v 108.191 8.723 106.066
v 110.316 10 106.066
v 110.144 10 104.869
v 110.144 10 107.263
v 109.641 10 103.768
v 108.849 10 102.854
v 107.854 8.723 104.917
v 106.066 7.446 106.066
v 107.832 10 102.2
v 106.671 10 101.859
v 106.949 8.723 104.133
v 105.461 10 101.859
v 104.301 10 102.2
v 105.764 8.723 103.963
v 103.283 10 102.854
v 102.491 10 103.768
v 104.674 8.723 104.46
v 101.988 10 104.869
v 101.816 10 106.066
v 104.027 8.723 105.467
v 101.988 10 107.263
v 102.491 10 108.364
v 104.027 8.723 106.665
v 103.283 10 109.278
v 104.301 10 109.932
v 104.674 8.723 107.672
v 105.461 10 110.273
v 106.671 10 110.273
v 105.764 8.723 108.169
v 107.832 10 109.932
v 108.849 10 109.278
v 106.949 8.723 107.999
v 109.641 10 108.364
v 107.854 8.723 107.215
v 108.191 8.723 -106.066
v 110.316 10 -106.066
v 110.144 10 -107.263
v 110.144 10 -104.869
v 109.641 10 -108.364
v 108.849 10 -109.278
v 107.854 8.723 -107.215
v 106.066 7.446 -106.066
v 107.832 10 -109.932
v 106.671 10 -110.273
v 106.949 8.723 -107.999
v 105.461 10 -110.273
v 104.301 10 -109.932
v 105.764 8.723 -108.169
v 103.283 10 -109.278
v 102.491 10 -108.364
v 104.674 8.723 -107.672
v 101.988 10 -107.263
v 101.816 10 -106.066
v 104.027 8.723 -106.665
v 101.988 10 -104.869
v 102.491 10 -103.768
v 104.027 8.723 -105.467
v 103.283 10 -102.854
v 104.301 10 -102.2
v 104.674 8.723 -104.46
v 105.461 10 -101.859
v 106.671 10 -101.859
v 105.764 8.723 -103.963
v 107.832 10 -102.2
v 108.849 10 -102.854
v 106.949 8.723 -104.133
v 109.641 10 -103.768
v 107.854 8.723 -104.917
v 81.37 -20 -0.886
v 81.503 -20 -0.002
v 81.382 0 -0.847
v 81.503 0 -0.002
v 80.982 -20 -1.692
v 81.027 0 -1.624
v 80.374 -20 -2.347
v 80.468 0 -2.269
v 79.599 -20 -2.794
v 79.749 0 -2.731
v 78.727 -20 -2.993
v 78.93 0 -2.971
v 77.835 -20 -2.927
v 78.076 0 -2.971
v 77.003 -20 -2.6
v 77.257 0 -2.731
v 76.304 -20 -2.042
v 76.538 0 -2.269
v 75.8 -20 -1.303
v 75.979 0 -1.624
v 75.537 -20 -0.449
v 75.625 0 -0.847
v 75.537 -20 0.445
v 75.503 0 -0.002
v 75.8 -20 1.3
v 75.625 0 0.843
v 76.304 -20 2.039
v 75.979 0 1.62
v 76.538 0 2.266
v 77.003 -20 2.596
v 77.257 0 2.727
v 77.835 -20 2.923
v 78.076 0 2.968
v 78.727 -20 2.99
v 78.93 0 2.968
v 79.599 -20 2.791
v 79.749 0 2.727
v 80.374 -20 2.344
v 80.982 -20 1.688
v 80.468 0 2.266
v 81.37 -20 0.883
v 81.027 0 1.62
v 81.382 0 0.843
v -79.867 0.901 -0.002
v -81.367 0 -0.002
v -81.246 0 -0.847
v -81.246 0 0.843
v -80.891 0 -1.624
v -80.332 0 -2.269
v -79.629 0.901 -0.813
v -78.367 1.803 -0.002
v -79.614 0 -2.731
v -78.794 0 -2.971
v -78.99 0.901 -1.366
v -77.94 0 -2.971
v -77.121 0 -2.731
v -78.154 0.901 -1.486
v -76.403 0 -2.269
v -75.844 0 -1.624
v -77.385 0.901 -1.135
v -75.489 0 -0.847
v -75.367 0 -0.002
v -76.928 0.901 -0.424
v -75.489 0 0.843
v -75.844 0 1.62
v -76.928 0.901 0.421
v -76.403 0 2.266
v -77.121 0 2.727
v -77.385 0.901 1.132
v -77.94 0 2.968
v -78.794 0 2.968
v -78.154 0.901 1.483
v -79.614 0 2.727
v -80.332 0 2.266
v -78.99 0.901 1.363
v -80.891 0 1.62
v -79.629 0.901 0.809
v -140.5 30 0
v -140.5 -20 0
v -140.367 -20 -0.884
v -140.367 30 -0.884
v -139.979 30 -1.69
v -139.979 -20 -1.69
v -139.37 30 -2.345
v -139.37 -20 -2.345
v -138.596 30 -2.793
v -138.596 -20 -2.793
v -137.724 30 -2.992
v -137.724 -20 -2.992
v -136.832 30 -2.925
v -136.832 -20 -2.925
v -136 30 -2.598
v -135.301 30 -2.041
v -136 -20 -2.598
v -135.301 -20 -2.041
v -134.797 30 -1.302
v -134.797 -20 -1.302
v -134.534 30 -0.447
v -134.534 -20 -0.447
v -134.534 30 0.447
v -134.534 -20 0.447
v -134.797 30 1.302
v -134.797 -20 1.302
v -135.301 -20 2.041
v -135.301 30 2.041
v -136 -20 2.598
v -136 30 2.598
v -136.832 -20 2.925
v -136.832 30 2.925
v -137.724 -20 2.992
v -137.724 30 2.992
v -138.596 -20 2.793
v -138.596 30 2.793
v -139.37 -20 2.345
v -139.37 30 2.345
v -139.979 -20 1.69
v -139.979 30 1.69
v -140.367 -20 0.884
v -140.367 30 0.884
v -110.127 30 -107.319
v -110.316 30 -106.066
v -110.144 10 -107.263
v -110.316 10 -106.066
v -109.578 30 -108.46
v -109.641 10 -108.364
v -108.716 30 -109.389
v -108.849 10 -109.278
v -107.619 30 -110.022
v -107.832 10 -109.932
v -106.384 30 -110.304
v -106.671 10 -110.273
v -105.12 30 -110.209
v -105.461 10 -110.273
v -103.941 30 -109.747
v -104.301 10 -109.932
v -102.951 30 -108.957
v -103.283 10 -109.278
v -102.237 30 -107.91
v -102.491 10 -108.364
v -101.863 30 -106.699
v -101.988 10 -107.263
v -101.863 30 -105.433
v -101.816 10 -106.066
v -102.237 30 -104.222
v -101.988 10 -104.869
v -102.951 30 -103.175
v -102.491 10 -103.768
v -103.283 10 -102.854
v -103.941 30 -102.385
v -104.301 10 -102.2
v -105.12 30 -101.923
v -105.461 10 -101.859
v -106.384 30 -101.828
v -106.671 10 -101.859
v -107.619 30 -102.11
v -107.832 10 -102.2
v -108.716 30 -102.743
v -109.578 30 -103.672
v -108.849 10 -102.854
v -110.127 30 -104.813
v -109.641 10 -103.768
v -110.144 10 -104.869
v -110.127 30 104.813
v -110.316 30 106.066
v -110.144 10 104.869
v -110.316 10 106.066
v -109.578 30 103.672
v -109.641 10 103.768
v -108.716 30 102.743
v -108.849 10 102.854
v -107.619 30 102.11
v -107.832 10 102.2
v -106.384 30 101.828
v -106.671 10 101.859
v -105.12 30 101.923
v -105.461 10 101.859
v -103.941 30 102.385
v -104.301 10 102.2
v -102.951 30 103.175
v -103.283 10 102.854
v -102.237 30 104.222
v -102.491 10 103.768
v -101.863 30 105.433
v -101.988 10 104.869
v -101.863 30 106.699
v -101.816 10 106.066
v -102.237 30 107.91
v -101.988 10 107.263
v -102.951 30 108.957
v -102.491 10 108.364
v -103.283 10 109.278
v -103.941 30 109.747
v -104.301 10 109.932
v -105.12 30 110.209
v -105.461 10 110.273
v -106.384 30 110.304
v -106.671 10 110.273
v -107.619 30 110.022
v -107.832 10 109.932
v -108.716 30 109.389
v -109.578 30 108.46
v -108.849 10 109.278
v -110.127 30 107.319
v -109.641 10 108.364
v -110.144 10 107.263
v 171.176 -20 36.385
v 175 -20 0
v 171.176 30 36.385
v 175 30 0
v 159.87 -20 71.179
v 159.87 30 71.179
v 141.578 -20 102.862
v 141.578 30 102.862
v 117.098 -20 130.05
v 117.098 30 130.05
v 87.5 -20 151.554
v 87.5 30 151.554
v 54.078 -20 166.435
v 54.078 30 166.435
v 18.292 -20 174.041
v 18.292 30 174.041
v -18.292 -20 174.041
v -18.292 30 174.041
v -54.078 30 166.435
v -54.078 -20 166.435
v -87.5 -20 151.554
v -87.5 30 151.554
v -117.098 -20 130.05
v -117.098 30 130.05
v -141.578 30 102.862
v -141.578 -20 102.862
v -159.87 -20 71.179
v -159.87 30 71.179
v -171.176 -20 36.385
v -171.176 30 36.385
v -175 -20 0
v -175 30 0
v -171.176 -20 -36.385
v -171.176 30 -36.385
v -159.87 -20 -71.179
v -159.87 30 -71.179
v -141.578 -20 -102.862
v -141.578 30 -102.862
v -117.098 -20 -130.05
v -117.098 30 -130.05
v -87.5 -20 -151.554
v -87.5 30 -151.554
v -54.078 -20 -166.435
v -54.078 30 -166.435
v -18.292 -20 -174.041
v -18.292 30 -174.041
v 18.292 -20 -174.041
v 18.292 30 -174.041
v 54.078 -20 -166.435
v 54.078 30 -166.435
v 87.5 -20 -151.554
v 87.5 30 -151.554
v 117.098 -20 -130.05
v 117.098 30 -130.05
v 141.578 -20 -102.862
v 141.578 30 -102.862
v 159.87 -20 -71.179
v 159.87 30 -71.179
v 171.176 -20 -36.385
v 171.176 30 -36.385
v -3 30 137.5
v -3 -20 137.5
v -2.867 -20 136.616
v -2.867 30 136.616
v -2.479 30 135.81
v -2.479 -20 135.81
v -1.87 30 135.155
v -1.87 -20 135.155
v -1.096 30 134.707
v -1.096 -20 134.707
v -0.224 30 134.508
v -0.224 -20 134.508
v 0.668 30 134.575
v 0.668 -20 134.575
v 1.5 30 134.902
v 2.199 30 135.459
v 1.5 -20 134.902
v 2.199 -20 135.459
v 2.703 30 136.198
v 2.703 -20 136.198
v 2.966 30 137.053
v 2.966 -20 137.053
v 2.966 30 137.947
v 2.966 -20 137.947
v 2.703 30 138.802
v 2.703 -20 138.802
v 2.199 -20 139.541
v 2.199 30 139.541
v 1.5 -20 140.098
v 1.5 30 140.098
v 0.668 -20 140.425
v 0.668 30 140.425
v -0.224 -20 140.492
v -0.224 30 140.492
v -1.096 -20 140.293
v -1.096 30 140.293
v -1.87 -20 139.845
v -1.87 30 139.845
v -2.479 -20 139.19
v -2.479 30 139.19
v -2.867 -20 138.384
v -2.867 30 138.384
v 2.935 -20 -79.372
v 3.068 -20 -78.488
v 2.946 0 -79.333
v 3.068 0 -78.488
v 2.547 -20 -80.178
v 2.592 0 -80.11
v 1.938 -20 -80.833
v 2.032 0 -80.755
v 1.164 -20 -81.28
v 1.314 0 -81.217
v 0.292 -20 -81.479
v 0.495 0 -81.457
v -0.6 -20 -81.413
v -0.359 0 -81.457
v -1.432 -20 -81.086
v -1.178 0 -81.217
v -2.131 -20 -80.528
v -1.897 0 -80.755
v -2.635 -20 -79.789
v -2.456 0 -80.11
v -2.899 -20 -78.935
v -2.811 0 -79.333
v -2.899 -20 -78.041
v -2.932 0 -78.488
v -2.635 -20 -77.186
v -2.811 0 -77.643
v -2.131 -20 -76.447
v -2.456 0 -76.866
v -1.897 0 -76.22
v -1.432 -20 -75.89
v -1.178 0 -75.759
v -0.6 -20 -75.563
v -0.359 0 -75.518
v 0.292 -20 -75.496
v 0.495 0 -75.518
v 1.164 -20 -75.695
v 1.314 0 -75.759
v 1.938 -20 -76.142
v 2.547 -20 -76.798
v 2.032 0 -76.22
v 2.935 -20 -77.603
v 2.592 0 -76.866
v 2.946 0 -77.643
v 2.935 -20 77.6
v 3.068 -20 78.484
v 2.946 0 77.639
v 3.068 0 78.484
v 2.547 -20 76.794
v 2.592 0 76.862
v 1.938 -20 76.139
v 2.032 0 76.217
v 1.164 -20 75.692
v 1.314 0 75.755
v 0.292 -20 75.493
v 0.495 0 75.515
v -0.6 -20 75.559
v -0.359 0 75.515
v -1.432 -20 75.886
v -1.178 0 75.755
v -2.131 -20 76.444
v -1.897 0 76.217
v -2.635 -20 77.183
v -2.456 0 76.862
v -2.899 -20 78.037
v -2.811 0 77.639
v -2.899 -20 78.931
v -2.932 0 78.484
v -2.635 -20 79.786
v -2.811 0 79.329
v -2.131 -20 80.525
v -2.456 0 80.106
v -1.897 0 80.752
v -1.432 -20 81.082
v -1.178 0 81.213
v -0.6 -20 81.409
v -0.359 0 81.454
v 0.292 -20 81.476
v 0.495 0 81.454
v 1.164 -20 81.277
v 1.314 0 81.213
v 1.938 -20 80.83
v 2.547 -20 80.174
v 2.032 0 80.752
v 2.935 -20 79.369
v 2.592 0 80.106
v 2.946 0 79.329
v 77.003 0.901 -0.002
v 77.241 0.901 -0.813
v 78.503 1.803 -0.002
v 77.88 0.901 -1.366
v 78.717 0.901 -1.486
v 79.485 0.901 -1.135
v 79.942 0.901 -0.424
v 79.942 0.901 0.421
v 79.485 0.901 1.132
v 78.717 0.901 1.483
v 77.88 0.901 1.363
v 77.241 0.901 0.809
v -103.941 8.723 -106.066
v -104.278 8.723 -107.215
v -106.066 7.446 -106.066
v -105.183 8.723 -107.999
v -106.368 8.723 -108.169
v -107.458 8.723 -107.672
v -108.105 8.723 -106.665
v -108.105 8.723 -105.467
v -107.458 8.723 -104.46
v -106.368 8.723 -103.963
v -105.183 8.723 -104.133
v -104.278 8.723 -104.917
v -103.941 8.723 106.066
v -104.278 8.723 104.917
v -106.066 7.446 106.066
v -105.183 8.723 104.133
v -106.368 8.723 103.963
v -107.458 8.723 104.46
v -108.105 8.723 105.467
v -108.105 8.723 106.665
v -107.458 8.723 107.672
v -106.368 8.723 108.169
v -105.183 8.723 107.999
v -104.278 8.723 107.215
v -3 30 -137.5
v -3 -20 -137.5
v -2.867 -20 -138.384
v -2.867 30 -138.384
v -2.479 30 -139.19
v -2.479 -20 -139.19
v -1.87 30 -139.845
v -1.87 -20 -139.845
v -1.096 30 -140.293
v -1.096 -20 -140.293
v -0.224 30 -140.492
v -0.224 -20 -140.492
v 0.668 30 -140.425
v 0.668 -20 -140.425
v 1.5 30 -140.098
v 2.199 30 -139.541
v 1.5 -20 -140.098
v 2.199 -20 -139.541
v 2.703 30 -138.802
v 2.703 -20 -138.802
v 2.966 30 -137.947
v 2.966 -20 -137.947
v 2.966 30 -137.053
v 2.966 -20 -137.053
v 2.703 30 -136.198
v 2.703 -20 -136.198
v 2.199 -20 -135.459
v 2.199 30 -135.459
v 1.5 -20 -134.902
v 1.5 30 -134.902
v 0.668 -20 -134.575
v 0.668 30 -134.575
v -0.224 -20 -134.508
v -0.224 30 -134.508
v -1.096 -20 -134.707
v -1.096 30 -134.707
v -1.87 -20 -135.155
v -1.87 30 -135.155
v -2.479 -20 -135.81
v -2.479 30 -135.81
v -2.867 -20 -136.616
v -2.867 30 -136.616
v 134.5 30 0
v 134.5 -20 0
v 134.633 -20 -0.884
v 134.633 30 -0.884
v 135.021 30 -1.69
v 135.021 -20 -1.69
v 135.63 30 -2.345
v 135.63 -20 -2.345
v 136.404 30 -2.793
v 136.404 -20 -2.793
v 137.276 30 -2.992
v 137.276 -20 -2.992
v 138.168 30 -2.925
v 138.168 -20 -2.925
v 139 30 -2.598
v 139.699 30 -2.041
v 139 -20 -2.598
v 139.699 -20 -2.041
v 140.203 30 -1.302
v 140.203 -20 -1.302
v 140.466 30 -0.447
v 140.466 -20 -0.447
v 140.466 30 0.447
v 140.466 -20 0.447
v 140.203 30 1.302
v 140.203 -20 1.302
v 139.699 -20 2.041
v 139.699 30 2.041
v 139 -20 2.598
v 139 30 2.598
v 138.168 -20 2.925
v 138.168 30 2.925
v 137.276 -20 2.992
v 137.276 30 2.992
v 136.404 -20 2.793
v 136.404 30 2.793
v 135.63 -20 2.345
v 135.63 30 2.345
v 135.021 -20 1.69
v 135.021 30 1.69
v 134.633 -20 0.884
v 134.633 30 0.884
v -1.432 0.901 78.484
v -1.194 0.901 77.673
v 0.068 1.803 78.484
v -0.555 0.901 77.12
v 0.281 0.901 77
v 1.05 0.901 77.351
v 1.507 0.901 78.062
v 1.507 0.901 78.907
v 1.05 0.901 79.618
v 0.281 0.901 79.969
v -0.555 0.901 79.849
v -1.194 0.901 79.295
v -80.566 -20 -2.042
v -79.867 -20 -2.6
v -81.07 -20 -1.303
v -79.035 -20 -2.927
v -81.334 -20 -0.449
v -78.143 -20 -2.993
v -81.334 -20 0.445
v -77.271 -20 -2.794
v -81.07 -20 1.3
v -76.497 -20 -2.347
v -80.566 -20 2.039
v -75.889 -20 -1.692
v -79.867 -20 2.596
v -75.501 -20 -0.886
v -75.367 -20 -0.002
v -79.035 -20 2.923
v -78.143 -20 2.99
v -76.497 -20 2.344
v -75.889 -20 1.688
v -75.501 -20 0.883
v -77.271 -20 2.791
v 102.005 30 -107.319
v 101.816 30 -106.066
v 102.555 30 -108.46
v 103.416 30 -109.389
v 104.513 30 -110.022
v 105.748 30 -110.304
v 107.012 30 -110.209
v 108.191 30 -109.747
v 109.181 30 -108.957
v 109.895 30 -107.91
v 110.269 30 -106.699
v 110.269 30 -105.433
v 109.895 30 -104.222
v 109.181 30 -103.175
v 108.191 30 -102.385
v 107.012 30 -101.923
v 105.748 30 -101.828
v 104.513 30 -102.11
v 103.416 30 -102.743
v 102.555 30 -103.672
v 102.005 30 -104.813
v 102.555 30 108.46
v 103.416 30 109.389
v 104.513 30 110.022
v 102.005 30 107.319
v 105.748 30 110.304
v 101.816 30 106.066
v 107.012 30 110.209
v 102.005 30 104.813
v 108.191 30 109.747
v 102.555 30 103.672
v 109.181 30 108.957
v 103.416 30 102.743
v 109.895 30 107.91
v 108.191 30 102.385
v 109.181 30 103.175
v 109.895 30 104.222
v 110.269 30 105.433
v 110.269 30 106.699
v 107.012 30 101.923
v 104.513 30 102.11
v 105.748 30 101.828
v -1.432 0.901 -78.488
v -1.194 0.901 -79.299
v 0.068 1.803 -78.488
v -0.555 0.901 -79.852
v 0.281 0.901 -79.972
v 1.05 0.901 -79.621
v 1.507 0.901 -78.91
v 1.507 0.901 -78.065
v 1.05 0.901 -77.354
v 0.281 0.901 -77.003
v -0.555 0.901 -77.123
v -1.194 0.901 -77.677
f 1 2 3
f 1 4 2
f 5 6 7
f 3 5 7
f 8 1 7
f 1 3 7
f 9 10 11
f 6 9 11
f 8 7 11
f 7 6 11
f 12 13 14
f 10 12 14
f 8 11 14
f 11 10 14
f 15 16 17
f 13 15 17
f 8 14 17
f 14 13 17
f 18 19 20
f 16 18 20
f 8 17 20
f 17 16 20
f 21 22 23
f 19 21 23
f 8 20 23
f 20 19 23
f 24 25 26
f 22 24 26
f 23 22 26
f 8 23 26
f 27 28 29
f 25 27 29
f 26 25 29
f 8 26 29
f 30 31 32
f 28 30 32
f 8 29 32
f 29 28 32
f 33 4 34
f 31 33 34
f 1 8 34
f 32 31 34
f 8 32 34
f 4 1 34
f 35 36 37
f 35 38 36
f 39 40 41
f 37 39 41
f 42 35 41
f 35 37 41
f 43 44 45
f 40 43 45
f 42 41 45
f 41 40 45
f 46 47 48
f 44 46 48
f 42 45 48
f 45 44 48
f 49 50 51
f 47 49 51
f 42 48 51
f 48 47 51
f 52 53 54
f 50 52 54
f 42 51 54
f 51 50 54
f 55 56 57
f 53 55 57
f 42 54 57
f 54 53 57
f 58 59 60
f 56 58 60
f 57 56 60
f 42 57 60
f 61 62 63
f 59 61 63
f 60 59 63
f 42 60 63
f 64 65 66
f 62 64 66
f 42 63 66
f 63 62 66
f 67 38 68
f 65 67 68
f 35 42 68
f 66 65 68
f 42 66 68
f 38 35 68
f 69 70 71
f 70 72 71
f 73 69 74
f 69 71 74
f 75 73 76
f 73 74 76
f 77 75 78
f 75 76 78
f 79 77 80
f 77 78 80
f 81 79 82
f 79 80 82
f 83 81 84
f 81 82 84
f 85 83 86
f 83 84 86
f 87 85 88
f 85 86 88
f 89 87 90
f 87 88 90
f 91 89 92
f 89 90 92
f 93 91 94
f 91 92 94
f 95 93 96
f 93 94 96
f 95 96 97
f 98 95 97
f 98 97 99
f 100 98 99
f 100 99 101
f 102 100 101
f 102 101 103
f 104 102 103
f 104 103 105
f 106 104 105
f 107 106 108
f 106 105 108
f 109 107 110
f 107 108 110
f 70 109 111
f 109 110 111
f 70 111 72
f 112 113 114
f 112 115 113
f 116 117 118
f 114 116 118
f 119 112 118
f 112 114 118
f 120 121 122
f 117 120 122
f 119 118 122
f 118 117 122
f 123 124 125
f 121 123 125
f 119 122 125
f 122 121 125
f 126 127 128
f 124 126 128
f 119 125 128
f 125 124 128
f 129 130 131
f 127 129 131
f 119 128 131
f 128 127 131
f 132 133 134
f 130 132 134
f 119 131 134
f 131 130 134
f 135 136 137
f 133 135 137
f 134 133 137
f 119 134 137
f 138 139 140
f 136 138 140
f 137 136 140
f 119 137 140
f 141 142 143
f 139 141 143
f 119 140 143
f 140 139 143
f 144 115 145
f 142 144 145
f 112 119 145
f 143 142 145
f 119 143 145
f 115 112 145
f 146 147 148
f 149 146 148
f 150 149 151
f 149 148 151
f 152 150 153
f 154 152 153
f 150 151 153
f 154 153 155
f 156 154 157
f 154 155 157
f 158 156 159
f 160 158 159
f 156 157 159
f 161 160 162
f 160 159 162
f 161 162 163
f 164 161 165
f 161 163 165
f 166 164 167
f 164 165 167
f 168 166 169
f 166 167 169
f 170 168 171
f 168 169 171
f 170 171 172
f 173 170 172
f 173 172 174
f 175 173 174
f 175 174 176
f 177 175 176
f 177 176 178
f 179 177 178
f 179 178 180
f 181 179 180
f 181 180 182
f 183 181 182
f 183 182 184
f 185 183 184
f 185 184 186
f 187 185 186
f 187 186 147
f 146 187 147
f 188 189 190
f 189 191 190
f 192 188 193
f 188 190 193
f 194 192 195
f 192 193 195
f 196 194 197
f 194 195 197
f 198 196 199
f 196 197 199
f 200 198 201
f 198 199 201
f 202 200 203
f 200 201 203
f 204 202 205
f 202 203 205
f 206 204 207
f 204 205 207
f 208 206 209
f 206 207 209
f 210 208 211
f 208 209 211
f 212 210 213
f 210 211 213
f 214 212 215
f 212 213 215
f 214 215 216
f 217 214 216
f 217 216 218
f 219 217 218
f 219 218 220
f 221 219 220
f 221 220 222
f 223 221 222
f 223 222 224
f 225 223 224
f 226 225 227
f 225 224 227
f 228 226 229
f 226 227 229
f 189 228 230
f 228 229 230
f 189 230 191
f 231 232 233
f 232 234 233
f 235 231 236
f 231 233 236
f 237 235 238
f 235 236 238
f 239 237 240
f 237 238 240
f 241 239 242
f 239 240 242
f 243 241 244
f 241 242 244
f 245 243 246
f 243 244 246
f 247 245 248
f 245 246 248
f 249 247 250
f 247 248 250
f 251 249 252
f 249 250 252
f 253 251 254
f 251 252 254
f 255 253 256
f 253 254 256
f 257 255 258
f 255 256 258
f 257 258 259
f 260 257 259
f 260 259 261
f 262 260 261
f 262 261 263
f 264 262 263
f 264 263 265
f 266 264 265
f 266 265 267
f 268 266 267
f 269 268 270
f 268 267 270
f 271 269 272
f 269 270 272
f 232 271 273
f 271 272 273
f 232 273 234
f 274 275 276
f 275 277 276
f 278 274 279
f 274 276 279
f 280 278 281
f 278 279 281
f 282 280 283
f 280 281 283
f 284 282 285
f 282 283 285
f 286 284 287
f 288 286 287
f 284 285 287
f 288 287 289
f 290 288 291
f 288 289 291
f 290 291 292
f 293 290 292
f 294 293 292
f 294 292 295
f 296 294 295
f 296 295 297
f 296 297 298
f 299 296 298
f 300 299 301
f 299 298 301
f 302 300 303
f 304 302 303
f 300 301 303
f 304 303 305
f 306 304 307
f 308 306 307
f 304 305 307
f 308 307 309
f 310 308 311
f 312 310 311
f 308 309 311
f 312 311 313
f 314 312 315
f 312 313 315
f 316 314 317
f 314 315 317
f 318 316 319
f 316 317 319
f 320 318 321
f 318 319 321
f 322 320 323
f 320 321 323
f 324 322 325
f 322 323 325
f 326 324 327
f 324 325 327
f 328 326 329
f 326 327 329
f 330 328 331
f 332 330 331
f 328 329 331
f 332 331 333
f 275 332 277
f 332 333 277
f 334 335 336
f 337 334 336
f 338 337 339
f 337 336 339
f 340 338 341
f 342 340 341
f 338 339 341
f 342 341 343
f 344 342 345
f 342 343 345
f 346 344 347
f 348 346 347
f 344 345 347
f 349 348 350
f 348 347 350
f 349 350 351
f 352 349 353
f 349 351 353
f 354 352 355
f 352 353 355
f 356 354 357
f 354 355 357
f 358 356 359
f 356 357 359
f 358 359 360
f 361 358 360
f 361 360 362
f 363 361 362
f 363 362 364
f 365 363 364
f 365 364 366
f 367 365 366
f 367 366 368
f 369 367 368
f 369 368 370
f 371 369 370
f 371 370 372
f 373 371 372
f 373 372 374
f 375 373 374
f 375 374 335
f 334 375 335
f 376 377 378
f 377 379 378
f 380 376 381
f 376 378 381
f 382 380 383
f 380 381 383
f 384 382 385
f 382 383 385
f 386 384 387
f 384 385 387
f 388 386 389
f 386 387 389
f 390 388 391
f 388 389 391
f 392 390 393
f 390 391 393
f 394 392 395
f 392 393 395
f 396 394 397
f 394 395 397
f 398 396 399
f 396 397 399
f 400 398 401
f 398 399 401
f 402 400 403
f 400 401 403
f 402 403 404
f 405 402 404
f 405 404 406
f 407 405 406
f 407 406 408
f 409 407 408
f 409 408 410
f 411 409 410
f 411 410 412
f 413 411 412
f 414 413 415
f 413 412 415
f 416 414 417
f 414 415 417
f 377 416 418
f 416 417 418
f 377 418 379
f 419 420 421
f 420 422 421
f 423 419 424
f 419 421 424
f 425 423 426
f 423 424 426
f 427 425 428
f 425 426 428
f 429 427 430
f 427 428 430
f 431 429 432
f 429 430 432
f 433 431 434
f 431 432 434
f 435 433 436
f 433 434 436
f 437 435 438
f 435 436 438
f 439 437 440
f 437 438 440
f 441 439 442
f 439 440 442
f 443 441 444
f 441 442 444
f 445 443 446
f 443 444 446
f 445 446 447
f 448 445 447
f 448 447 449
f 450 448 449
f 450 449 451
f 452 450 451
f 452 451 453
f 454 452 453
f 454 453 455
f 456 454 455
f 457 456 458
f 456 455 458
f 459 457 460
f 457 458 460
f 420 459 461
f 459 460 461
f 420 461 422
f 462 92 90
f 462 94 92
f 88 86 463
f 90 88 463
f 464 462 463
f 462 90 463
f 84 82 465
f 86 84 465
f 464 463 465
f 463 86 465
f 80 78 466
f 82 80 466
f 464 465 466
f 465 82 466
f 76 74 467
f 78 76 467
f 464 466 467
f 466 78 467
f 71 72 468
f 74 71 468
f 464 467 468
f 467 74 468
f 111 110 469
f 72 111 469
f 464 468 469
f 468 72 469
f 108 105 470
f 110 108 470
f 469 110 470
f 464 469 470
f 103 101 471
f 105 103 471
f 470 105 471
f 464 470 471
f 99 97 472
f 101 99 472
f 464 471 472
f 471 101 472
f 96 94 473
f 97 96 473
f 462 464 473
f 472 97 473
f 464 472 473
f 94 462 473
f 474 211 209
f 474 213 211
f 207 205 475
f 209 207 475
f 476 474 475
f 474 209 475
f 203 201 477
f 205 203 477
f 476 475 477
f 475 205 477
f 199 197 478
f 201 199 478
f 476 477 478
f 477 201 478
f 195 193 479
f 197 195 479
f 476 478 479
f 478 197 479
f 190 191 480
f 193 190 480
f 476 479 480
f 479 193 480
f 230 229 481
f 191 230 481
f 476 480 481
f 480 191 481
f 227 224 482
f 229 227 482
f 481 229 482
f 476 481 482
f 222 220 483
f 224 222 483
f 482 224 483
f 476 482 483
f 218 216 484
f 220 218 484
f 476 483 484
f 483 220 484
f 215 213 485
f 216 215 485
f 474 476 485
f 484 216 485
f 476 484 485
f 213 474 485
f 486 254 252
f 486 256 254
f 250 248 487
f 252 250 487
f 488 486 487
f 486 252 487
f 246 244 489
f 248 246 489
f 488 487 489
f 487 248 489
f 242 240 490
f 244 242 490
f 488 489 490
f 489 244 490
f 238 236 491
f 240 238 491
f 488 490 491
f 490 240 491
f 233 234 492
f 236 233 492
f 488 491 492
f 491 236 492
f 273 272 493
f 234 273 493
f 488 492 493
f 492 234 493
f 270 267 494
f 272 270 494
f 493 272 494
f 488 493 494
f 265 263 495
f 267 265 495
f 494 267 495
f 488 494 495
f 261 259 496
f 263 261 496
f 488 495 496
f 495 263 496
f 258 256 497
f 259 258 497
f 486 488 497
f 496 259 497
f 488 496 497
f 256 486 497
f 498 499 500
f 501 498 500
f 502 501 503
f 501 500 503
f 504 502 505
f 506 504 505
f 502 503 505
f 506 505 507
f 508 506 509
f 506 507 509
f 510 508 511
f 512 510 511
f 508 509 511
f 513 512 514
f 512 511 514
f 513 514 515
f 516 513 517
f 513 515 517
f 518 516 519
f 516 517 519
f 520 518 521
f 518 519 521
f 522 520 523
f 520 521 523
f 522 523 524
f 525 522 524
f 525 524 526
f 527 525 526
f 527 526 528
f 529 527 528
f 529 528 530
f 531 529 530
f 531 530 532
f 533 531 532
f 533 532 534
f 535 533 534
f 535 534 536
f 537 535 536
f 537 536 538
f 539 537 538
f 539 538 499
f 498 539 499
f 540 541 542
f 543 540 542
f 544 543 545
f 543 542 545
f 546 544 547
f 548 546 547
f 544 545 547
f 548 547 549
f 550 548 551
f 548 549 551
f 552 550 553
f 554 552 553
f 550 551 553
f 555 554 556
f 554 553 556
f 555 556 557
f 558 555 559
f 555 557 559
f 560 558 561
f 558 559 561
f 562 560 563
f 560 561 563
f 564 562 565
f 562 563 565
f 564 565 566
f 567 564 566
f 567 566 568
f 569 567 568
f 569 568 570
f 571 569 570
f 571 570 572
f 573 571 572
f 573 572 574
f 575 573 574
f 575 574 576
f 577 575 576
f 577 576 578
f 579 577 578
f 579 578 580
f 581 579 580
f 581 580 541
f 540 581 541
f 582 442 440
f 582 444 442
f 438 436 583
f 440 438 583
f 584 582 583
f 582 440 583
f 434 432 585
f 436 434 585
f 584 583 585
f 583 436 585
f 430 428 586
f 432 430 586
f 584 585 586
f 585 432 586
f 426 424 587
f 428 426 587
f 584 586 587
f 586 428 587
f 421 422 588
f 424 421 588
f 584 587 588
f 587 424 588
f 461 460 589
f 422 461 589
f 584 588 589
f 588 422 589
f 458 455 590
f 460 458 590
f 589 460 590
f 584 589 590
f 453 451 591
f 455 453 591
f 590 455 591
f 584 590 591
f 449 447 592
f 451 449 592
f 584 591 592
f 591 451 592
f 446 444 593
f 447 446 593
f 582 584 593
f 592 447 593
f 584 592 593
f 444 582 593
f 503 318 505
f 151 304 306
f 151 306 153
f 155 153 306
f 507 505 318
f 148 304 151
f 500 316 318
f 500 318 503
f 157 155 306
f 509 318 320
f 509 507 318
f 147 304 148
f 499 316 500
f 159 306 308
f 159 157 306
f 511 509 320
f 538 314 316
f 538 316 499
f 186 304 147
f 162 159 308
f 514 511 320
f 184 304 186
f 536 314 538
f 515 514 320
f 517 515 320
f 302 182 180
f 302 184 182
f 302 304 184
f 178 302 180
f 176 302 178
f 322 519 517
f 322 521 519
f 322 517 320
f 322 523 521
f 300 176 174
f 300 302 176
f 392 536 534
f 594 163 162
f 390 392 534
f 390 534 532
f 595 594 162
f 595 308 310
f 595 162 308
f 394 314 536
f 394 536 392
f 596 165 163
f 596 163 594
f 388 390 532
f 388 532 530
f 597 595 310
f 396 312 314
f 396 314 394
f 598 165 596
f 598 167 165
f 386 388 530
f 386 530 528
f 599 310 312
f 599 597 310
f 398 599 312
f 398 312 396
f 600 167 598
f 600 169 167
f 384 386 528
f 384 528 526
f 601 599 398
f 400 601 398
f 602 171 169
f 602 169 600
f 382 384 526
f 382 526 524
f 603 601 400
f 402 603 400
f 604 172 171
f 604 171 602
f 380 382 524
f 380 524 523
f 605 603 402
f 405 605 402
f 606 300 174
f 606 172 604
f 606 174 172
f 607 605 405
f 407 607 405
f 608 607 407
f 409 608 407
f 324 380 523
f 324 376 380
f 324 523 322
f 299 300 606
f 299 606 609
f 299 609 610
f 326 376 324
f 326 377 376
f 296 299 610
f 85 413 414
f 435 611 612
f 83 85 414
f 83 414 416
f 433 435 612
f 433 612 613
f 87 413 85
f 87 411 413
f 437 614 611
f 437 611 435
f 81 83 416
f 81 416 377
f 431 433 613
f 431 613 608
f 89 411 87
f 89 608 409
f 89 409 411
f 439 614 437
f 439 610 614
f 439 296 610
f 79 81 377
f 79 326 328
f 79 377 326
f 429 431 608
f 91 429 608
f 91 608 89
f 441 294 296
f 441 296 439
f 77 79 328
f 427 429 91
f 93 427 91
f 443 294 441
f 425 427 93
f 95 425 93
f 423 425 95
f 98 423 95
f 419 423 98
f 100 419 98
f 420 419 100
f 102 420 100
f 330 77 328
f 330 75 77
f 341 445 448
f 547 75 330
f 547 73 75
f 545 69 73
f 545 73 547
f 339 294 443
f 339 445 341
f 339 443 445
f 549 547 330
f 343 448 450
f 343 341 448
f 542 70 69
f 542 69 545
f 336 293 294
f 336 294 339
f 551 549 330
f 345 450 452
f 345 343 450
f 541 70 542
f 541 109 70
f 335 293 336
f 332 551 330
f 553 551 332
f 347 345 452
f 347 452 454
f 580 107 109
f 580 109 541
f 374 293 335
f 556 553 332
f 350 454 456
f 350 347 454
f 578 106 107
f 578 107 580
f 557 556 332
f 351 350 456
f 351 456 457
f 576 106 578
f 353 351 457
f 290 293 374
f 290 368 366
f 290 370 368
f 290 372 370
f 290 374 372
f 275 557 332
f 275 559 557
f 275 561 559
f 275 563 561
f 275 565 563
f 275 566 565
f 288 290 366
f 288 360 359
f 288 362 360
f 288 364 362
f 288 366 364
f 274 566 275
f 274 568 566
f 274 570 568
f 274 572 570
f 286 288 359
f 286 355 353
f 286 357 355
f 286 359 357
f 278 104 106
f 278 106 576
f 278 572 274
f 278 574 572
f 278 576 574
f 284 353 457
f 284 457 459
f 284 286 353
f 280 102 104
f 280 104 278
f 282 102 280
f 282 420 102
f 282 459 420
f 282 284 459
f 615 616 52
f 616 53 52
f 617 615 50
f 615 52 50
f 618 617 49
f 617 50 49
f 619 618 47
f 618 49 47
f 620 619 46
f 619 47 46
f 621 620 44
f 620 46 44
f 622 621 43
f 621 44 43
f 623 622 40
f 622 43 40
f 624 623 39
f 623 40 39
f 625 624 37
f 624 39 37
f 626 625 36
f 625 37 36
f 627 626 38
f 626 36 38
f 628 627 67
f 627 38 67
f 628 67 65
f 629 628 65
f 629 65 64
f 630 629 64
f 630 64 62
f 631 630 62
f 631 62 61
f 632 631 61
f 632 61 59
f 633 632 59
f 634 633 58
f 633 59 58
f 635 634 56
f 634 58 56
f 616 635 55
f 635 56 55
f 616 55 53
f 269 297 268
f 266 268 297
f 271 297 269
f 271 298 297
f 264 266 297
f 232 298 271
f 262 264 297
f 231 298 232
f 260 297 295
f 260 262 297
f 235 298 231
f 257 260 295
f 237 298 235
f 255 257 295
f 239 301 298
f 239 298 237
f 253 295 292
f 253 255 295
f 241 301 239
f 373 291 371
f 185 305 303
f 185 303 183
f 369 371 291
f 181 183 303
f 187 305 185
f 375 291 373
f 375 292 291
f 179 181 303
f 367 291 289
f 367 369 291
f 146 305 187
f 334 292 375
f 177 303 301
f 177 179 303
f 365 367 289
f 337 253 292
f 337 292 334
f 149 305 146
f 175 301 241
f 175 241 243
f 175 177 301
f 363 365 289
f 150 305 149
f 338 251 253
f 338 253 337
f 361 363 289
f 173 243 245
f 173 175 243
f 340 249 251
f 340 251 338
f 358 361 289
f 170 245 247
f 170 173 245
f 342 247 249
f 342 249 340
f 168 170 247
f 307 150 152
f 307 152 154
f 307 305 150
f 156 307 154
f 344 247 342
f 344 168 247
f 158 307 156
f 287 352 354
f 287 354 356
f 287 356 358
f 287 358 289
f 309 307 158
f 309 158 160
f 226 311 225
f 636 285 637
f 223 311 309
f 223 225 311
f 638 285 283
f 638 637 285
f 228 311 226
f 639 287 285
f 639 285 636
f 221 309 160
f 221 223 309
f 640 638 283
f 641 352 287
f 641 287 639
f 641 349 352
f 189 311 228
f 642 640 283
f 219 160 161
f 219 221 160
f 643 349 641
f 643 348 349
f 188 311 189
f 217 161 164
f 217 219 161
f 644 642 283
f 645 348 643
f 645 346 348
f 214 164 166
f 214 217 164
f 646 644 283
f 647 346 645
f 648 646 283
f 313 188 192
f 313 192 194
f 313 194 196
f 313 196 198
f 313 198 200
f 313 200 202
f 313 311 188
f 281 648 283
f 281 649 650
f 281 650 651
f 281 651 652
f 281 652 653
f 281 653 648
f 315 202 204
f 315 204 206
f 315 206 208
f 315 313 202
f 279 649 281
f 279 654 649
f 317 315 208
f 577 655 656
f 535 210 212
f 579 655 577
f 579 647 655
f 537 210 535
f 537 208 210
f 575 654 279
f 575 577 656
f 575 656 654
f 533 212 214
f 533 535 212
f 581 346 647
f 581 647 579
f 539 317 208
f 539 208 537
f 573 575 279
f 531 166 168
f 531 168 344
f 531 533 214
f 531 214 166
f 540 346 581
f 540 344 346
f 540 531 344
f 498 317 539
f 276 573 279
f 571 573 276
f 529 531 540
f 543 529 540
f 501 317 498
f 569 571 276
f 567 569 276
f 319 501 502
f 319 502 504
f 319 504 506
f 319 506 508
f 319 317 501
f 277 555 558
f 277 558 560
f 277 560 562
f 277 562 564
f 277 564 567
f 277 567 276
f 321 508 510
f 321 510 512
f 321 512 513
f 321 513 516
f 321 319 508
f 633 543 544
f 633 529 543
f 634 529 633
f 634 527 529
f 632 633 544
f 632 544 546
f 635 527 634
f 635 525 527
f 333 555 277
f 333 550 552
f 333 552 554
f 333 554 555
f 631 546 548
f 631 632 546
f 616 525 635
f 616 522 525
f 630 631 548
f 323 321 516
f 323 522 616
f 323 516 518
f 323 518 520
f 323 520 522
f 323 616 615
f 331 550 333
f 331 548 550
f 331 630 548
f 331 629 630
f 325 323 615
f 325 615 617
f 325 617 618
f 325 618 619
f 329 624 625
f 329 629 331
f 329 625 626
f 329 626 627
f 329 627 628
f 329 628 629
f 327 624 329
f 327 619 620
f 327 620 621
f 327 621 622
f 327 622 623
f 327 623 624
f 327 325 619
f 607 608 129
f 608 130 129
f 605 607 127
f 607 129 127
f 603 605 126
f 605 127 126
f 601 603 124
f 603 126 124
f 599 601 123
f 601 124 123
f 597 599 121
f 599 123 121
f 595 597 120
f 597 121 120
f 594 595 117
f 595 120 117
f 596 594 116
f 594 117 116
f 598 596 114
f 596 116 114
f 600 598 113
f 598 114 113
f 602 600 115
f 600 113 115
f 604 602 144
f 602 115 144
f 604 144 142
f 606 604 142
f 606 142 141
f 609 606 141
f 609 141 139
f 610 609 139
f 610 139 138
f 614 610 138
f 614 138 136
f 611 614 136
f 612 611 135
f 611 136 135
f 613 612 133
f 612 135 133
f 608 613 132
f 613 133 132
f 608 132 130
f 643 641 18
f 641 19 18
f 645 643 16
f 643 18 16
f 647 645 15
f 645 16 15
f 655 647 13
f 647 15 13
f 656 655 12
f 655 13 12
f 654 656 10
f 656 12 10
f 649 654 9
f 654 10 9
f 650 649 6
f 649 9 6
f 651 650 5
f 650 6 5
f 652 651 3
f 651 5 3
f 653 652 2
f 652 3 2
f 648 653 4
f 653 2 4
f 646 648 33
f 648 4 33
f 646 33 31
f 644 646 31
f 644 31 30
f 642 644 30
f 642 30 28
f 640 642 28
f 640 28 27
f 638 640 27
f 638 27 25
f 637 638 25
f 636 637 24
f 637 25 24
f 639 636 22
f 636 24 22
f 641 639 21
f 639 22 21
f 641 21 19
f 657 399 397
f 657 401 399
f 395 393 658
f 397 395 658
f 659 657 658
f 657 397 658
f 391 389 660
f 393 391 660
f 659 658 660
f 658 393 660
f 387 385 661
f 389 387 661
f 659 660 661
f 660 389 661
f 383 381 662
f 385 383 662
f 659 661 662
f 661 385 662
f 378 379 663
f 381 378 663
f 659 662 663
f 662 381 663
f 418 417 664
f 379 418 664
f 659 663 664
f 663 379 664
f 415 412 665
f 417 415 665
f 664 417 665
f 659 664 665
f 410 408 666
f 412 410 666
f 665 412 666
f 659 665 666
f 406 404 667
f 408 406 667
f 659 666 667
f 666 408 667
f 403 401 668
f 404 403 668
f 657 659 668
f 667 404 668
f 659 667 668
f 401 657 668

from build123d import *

# Parameters (mm, degrees)
SKETCH1_R                        = 175
BOSS_EXTRUDE1_DEPTH              = 30
TAP_DRILL_FOR_M10X1_5_TAP1_D     = 8.5
TAP_DRILL_FOR_M10X1_5_TAP1_DEPTH = 20
TAP_DRILL_FOR_M10X1_5_TAP1_TIP   = 2.553657631
BOSS_EXTRUDE2_START              = 20
SKETCH7_R                        = 175
BOSS_EXTRUDE2_DEPTH              = 20
F_6_0_6_DIAMETER_HOLE1_D         = 6
TAP_DRILL_FOR_M7X1_0_TAP2_D      = 6
TAP_DRILL_FOR_M7X1_0_TAP2_DEPTH  = 20
TAP_DRILL_FOR_M7X1_0_TAP2_TIP    = 1.802581857


with BuildPart() as part:
    # Sketch1 → Boss-Extrude1 (new body)
    with BuildSketch(Plane(origin=(0, 0, 0), x_dir=(1, 0, 0), z_dir=(0, 1, 0))):
        Circle(SKETCH1_R)
    extrude(amount=BOSS_EXTRUDE1_DEPTH)

    # Tap Drill for M10x1.5 Tap1
    with Locations(Plane(origin=(0, 30, 0), x_dir=(1, 0, 0), z_dir=(0, 1, 0))):
        with Locations((-106.066017178, -106.066017178), (106.066017178, -106.066017178), (106.066017178, 106.066017178), (-106.066017178, 106.066017178)):
            Hole(TAP_DRILL_FOR_M10X1_5_TAP1_D / 2, depth=TAP_DRILL_FOR_M10X1_5_TAP1_DEPTH)
            with Locations((0, 0, -(TAP_DRILL_FOR_M10X1_5_TAP1_DEPTH + TAP_DRILL_FOR_M10X1_5_TAP1_TIP / 2))):  # 118° drill point
                Cone(0, TAP_DRILL_FOR_M10X1_5_TAP1_D / 2, TAP_DRILL_FOR_M10X1_5_TAP1_TIP, mode=Mode.SUBTRACT)

    # Sketch7 → Boss-Extrude2 (add)
    with BuildSketch(Plane.XZ.offset(BOSS_EXTRUDE2_START)):
        Circle(SKETCH7_R)
    extrude(amount=-BOSS_EXTRUDE2_DEPTH)

    # Ø6.0 (6) Diameter Hole1 (through all)
    with Locations(Plane(origin=(0, 30, 0), x_dir=(1, 0, 0), z_dir=(0, 1, 0))):
        with Locations((-137.5, 0), (0, -137.5), (137.5, 0), (0, 137.5)):
            Hole(F_6_0_6_DIAMETER_HOLE1_D / 2)

    # Tap Drill for M7x1.0 Tap2
    with Locations(Plane(origin=(0, -20, 0), x_dir=(-1, 0, 0), z_dir=(0, -1, 0))):
        with Locations((78.367338092, 0.001727747), (-0.067861908, -78.484272253), (-78.503061908, 0.001727747), (-0.067861908, 78.487727747)):
            Hole(TAP_DRILL_FOR_M7X1_0_TAP2_D / 2, depth=TAP_DRILL_FOR_M7X1_0_TAP2_DEPTH)
            with Locations((0, 0, -(TAP_DRILL_FOR_M7X1_0_TAP2_DEPTH + TAP_DRILL_FOR_M7X1_0_TAP2_TIP / 2))):  # 118° drill point
                Cone(0, TAP_DRILL_FOR_M7X1_0_TAP2_D / 2, TAP_DRILL_FOR_M7X1_0_TAP2_TIP, mode=Mode.SUBTRACT)


solid = part.part
